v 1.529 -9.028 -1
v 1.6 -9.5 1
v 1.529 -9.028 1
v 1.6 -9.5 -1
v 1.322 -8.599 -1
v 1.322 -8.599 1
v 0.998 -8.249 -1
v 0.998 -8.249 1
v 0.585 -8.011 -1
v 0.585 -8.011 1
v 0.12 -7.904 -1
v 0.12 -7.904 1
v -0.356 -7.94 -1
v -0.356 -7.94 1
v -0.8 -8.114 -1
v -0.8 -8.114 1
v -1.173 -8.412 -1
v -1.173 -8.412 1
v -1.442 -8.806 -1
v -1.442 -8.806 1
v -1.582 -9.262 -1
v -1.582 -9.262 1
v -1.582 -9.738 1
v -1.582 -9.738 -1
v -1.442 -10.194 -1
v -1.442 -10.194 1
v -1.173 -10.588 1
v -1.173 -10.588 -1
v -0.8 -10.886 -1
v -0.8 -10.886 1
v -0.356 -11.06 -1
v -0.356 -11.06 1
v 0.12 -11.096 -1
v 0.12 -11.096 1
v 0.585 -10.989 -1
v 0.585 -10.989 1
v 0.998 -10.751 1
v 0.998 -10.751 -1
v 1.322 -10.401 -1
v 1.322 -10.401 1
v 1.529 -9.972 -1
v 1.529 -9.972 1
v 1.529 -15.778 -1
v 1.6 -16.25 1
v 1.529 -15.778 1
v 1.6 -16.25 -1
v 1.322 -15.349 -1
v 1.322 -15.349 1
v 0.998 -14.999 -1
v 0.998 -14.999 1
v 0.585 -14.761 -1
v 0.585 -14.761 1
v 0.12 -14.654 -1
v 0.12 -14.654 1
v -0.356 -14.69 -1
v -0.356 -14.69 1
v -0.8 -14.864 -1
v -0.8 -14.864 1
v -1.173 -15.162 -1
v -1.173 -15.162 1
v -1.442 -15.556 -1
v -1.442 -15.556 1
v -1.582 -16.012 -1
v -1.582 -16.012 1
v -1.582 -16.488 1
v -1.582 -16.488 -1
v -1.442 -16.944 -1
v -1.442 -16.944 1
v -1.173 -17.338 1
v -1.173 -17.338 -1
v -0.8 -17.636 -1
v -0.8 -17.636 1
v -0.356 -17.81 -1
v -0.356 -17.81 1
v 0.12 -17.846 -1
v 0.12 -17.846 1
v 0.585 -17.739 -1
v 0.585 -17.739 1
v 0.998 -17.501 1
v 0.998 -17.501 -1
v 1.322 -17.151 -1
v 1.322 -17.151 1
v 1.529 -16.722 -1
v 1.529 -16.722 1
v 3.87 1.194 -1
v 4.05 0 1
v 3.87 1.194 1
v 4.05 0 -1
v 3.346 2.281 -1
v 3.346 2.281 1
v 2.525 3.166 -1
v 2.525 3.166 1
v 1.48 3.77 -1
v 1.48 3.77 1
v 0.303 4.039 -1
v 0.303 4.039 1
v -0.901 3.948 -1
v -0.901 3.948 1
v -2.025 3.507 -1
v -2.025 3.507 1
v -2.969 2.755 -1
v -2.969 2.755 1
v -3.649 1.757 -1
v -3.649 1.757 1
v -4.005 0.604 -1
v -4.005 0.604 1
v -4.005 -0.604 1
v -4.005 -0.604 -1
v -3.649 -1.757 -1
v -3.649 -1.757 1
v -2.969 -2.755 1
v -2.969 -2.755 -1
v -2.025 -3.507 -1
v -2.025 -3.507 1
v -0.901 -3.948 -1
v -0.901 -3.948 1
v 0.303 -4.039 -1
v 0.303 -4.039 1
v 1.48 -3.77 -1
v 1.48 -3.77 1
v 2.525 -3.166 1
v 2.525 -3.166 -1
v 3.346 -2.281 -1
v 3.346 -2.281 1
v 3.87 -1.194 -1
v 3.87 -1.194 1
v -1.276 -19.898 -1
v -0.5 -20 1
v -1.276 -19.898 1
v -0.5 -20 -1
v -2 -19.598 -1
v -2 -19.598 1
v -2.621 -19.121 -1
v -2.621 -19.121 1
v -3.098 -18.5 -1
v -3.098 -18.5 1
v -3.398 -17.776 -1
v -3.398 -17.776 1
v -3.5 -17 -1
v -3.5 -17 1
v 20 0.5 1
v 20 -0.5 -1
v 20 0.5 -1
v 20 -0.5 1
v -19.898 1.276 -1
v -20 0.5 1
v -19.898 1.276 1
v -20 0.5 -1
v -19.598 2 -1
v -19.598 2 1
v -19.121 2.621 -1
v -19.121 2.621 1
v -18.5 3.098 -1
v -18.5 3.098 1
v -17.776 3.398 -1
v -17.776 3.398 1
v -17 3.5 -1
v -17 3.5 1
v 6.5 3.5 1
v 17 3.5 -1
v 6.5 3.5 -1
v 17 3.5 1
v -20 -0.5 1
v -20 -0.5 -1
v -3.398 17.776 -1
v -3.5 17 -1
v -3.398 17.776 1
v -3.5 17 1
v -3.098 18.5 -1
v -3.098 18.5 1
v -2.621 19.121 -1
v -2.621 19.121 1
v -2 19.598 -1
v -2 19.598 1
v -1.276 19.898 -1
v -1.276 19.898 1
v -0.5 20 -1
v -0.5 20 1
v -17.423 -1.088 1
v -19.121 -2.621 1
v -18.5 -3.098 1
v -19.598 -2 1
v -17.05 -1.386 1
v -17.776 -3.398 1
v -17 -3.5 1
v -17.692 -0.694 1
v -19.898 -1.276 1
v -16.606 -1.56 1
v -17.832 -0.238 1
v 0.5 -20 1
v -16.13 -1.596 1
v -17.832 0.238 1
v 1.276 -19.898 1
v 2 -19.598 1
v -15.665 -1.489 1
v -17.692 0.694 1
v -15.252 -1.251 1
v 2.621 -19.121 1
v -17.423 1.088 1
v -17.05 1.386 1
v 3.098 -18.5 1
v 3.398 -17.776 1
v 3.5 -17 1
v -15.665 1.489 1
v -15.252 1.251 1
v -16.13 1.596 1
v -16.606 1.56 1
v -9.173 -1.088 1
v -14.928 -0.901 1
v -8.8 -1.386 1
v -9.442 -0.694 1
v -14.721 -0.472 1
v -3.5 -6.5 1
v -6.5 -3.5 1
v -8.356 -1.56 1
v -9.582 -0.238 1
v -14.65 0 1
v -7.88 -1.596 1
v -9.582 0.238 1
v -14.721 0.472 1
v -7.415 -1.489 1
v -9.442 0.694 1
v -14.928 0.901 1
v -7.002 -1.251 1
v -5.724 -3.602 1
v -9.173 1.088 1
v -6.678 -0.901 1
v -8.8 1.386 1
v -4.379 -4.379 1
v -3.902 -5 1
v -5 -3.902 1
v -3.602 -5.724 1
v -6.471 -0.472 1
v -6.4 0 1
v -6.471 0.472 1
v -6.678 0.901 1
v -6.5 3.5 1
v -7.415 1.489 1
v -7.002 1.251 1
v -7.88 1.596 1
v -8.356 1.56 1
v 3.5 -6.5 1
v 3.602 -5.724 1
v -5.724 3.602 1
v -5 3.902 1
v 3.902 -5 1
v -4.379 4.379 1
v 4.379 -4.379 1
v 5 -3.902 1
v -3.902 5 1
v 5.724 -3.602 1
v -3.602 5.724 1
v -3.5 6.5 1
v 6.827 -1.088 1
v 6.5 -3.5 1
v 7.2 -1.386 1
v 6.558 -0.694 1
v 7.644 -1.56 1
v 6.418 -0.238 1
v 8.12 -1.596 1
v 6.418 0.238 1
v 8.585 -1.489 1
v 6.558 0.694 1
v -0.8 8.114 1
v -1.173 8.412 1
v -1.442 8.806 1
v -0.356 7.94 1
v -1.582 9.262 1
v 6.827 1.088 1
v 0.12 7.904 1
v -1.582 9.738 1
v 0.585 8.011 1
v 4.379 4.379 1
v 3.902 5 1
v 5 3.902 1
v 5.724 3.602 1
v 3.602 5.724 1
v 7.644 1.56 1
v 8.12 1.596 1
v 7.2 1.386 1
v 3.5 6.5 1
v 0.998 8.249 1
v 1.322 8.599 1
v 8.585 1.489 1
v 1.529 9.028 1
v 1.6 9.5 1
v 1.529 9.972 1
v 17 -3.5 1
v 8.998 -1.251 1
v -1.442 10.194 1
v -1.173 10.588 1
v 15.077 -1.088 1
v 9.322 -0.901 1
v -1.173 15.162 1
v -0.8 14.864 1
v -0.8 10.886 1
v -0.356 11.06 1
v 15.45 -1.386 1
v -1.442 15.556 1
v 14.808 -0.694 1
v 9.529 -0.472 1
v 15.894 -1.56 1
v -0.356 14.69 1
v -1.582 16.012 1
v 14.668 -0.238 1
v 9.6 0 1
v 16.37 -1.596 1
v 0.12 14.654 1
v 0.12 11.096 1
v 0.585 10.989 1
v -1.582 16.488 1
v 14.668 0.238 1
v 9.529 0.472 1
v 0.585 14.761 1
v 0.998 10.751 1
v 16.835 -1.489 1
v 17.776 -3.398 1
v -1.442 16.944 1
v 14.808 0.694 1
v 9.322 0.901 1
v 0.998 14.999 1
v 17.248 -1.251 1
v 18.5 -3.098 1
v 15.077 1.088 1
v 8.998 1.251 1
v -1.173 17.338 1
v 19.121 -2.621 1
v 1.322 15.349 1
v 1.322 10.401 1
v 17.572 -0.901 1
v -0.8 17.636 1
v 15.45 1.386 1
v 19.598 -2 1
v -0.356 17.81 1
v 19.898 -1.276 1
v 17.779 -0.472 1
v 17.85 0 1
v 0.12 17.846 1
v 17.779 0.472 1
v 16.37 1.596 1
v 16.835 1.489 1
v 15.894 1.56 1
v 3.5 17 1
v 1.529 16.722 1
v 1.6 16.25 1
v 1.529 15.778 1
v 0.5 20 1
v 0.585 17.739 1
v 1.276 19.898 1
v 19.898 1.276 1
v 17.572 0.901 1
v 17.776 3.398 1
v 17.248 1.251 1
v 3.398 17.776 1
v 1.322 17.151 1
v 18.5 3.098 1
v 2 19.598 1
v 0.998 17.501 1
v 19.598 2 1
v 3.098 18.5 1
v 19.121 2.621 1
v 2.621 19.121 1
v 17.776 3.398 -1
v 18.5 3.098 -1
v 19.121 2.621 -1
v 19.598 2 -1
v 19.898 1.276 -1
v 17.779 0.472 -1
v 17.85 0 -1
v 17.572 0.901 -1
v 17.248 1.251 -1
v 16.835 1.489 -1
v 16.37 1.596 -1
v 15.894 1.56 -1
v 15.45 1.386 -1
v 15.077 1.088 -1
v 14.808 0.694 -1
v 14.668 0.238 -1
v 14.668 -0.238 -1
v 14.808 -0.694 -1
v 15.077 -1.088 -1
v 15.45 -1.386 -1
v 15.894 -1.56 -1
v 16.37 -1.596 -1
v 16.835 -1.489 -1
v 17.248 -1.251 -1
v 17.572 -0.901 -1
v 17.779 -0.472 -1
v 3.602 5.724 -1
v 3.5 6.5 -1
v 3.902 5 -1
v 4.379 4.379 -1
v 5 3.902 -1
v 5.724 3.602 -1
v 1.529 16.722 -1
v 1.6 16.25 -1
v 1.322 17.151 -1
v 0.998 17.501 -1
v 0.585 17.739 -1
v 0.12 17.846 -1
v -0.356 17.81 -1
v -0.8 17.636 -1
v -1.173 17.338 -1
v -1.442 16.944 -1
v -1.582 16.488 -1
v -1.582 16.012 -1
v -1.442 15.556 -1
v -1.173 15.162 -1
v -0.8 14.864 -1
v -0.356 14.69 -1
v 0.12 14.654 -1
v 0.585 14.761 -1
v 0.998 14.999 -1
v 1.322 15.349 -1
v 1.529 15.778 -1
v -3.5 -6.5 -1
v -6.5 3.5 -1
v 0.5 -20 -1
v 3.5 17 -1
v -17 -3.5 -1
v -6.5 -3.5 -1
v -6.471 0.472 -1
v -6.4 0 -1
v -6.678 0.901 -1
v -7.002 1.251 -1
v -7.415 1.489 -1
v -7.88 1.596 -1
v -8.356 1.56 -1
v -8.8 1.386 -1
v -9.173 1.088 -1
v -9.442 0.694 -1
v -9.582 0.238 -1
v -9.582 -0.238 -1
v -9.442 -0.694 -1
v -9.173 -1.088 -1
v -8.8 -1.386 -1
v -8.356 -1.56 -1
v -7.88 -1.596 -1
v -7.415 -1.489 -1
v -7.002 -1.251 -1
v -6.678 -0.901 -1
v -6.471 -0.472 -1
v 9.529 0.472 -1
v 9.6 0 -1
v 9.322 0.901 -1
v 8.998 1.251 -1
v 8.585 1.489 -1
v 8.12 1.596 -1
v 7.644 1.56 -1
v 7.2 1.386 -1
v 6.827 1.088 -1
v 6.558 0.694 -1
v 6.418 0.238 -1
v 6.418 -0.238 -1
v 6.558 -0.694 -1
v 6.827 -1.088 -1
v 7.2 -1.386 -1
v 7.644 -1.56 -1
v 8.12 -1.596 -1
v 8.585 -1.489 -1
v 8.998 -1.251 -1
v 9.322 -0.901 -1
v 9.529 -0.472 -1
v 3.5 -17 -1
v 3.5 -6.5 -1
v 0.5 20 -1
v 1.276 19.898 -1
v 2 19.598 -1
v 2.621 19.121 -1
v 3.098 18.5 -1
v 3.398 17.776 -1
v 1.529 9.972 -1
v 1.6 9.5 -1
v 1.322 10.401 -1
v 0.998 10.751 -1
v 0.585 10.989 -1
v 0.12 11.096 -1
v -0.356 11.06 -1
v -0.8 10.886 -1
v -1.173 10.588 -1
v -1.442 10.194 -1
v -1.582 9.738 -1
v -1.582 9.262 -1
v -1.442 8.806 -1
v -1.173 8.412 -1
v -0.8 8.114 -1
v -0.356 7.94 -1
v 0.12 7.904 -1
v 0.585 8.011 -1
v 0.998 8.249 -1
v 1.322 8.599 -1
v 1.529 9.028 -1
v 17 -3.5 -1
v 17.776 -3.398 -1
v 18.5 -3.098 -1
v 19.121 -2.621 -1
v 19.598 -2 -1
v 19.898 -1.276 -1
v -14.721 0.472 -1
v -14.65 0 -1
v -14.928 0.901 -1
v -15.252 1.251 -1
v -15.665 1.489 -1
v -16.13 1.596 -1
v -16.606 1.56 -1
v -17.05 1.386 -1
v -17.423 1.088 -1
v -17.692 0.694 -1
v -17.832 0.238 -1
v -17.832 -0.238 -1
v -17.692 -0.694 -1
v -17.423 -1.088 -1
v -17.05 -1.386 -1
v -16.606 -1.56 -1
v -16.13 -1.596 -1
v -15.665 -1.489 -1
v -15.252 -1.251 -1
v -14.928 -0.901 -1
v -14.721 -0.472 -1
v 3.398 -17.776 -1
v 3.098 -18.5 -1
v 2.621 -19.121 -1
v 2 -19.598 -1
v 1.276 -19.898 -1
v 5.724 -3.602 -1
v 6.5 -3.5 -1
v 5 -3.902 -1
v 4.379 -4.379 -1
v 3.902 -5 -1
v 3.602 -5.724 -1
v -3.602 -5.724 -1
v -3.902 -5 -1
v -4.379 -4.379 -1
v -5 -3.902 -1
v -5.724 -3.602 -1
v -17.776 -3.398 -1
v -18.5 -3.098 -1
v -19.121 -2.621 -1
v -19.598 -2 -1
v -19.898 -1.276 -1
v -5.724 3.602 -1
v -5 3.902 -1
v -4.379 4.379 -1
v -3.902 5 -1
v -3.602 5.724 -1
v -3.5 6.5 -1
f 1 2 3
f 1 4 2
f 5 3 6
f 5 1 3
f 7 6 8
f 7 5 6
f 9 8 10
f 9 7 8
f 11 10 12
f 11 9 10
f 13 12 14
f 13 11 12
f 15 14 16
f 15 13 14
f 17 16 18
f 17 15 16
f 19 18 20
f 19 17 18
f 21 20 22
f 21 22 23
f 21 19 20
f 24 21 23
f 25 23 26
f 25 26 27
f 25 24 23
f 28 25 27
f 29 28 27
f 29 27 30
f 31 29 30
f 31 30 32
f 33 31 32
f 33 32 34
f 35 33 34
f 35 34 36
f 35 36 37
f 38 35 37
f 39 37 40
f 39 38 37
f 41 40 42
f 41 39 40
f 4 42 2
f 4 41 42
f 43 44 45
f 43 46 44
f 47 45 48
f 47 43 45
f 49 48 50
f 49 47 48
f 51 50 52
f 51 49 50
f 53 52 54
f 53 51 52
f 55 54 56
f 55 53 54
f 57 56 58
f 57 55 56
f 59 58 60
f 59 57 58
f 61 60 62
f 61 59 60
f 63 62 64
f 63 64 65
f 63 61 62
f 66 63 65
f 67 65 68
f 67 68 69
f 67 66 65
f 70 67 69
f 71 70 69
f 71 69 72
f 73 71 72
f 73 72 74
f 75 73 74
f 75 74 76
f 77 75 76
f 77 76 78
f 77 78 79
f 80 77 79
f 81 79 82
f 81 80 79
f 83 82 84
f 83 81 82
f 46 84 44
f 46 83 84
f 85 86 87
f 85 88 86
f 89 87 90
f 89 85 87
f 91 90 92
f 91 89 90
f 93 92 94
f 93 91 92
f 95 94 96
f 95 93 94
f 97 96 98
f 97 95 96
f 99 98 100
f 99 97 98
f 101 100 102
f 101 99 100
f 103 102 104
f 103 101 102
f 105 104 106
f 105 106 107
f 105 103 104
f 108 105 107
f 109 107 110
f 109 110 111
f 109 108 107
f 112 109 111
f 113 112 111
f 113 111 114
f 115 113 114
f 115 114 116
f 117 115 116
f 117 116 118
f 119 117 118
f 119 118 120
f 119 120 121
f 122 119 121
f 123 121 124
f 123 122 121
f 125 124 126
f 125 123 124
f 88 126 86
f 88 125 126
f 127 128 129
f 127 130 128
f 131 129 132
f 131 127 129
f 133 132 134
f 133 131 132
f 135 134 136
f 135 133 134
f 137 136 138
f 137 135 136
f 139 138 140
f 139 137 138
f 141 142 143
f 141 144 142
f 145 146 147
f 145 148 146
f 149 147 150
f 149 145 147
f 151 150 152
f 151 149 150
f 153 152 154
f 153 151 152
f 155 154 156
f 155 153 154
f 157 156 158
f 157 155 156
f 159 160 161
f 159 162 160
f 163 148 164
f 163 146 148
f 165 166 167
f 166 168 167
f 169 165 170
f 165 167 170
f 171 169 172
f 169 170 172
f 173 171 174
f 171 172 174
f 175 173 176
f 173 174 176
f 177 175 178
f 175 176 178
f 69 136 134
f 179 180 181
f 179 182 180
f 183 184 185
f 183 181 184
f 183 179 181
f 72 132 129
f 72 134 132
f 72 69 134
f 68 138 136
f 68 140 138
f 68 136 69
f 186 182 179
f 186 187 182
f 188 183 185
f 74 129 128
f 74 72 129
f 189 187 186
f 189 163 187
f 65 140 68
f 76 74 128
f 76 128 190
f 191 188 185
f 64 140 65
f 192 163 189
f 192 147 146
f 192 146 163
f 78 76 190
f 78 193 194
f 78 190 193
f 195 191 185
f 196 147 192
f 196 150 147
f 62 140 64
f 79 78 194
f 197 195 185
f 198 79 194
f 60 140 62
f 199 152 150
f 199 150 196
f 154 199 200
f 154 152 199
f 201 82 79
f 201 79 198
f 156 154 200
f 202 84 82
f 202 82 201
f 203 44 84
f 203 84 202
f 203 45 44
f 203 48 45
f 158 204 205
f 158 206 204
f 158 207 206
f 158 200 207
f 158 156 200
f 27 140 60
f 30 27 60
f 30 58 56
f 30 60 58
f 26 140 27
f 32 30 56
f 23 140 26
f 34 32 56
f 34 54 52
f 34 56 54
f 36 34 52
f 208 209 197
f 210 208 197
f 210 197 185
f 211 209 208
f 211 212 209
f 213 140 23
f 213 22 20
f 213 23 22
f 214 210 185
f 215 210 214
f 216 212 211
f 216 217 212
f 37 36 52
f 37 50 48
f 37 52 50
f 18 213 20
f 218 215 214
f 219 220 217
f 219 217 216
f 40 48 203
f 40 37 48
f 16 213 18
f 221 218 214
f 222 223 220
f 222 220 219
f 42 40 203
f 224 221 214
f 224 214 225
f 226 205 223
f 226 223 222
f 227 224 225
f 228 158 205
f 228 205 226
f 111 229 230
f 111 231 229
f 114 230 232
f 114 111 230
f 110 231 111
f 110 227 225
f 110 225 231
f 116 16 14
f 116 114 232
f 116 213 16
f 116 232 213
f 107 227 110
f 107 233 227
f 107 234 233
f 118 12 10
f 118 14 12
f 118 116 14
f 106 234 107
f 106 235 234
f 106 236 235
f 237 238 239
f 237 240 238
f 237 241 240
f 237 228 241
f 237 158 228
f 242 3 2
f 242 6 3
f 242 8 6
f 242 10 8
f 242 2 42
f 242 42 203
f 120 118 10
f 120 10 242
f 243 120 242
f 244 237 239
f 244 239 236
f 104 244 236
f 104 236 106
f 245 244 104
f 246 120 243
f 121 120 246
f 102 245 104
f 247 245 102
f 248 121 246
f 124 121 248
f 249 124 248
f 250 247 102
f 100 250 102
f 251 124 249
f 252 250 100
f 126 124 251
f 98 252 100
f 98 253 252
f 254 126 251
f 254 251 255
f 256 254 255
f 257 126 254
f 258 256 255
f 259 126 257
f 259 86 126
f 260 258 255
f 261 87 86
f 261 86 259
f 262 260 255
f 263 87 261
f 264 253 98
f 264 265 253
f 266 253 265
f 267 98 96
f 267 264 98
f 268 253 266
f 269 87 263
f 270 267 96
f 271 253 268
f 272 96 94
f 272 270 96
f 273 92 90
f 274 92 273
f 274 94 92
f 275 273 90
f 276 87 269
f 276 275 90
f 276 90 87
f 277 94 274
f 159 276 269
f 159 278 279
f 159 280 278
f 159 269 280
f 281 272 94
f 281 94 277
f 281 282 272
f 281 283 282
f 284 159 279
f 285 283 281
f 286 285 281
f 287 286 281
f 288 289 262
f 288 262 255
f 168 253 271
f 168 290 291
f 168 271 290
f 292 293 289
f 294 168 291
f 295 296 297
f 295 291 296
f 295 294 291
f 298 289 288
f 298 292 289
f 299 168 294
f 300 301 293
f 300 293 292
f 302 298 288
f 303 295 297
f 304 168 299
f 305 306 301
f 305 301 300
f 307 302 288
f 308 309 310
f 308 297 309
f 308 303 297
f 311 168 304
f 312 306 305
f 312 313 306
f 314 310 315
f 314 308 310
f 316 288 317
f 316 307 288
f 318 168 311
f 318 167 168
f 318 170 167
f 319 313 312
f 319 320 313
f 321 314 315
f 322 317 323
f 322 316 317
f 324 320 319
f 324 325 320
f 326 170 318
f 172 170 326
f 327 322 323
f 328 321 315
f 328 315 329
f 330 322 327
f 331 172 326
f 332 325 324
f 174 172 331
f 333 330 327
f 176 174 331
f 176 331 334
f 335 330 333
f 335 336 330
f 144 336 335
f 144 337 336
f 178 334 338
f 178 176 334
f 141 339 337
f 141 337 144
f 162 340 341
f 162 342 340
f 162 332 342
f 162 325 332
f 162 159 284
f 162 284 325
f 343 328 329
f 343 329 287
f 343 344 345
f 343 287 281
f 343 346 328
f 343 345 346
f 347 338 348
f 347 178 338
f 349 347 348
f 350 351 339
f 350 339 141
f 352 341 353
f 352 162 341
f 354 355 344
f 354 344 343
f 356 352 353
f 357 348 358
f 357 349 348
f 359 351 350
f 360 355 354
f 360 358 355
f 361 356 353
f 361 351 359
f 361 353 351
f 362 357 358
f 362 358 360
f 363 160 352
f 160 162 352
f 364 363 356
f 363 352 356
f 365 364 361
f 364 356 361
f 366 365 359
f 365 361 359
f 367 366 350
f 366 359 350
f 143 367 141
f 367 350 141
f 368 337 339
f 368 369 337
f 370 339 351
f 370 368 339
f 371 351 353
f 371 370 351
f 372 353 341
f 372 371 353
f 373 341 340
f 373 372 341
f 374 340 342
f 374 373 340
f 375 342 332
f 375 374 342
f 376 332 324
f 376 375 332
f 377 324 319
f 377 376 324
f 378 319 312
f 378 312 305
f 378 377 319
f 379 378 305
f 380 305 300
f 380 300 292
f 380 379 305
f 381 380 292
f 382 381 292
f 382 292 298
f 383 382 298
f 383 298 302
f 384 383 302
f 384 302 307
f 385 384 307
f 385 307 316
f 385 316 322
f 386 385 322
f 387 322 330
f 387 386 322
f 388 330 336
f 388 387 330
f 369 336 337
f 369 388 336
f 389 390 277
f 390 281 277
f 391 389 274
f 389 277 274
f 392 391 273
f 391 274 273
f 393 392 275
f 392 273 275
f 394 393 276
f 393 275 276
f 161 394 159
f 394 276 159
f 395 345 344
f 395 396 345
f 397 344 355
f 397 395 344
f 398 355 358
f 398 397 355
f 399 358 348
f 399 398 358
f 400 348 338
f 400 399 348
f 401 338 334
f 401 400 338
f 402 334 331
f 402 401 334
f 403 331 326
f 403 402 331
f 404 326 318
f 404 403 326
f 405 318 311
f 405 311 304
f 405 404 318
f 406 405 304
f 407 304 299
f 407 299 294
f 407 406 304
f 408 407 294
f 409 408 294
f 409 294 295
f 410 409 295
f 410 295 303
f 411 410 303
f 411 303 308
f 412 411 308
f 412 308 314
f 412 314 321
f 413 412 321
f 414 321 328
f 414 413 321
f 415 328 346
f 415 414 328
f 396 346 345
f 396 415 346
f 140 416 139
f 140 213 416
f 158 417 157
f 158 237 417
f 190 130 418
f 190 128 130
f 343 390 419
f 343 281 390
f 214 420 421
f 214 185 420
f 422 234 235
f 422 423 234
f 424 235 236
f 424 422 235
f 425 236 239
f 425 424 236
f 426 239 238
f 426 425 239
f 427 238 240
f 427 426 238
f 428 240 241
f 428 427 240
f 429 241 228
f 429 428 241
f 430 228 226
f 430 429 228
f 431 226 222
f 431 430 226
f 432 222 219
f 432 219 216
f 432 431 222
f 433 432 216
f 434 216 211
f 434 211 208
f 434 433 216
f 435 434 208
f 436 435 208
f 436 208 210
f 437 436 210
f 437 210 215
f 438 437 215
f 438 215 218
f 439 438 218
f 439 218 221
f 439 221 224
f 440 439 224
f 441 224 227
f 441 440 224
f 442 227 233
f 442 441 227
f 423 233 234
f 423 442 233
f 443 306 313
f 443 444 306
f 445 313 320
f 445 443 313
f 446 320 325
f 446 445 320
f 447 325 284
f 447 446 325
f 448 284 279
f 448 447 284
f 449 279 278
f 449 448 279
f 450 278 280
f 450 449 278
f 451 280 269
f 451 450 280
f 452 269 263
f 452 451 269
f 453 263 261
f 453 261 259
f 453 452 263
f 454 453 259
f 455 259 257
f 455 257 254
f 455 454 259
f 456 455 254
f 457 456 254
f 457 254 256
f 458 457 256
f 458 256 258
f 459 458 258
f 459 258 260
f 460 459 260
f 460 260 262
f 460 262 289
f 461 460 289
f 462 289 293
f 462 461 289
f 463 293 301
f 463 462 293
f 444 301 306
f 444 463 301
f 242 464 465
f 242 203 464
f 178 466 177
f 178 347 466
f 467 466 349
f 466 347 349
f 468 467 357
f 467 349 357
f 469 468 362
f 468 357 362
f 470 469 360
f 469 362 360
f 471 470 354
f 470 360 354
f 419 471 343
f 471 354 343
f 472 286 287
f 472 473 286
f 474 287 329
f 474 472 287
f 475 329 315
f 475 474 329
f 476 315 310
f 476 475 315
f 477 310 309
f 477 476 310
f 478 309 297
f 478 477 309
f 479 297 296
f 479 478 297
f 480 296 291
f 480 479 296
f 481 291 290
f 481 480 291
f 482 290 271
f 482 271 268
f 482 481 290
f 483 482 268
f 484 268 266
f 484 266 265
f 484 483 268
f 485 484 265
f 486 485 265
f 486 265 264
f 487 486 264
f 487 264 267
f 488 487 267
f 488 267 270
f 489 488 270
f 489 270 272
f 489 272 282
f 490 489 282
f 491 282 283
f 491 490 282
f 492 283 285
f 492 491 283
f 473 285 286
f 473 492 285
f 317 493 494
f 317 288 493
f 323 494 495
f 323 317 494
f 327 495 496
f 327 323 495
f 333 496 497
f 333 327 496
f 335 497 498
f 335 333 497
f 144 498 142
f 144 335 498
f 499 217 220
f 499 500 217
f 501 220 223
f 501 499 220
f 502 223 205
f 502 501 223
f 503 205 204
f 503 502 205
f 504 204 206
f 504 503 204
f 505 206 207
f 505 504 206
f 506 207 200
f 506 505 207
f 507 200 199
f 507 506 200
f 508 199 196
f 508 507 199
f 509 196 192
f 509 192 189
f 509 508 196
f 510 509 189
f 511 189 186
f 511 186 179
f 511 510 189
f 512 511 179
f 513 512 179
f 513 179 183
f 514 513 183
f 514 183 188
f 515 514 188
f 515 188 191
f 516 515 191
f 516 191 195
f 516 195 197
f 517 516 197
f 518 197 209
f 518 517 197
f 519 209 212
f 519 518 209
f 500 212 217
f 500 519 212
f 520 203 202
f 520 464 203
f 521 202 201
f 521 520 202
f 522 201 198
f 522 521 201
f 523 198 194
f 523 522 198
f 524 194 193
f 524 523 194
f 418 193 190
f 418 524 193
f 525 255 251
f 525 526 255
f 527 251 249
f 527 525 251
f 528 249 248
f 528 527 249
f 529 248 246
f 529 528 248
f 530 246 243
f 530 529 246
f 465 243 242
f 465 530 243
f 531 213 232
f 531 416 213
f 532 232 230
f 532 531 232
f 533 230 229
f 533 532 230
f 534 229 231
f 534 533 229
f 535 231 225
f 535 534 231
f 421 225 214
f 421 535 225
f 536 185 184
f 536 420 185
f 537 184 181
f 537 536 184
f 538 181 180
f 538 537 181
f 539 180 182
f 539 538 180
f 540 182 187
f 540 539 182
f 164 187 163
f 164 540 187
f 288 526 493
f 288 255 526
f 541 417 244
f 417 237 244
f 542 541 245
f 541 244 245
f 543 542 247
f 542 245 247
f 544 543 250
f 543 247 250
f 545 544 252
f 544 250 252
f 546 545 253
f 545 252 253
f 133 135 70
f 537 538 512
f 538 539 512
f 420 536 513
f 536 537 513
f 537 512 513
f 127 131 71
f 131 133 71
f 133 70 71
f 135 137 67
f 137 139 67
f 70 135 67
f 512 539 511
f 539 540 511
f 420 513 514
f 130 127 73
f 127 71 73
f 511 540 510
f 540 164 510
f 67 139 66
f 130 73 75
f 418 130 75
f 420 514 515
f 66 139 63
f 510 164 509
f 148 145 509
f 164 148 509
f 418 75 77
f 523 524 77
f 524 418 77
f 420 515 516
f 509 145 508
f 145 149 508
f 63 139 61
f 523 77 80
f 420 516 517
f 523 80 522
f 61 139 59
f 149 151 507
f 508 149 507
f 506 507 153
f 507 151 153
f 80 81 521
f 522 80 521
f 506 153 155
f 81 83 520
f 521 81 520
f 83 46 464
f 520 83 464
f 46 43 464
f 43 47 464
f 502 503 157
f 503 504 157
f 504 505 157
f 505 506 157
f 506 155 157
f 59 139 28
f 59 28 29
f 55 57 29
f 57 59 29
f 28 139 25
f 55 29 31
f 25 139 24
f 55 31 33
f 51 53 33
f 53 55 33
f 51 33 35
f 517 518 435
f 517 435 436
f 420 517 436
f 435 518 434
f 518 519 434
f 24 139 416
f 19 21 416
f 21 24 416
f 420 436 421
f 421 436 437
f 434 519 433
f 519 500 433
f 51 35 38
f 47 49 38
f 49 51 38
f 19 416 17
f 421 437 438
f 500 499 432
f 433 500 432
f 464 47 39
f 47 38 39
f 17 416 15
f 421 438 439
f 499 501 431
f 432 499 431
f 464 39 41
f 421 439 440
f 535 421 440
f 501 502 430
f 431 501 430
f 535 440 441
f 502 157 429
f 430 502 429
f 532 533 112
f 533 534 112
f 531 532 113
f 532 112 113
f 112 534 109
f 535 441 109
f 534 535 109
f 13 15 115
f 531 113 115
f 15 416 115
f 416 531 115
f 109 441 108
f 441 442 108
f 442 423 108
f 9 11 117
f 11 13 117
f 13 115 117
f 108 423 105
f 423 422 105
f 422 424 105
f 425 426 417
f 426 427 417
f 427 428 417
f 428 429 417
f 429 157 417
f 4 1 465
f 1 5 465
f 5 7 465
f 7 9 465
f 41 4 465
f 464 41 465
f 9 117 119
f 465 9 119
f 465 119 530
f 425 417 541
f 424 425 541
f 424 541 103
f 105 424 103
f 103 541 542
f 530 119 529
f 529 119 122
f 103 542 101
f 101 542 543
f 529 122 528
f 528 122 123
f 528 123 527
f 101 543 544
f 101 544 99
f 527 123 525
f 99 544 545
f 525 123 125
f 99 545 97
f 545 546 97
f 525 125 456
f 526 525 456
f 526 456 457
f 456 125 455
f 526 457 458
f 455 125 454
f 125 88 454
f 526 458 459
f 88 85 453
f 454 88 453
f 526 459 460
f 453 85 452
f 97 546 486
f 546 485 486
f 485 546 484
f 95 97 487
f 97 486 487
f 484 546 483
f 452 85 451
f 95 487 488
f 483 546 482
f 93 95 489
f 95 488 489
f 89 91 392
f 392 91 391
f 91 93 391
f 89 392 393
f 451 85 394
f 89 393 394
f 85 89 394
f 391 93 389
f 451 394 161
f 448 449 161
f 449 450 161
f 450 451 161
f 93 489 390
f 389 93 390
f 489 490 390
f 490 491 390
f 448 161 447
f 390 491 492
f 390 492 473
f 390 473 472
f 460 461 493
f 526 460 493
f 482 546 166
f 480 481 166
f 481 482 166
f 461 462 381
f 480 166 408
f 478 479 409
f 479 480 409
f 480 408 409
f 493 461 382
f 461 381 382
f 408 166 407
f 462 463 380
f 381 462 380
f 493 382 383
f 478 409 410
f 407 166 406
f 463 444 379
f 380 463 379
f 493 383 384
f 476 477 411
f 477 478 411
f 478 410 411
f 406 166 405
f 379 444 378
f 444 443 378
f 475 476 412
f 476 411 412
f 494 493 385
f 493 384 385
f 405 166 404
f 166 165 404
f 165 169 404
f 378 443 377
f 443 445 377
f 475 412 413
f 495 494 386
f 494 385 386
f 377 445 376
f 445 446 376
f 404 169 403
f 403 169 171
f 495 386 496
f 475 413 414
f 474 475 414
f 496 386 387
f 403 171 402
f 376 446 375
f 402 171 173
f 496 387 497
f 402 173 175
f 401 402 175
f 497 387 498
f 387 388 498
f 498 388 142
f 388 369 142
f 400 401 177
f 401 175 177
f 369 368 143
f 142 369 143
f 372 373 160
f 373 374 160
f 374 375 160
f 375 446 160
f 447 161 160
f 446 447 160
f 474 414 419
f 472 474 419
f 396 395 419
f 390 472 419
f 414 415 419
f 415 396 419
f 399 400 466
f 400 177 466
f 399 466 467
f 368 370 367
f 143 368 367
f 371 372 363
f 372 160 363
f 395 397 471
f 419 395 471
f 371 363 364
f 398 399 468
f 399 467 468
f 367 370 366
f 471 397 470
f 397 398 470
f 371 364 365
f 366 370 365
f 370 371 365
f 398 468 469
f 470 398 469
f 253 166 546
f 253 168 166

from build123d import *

# Parameters (mm, degrees)
CROQUIS1_R              = 1.6
CROQUIS1_R_2            = 4.05
SALIENTE_EXTRUIR1_DEPTH = 1
REDONDEO1_R             = 3


with BuildPart() as part:
    # Croquis1 → Saliente-Extruir1 (new body, symmetric)
    with BuildSketch(Plane.XY):
        Polygon((3.5, -3.5), (20, -3.5), (20, 3.5), (3.5, 3.5), (3.5, 20), (-3.5, 20), (-3.5, 3.5), (-20, 3.5), (-20, -3.5), (-3.5, -3.5), (-3.5, -20), (3.5, -20), align=None)
        with Locations((-8, 0)):
            Circle(CROQUIS1_R, mode=Mode.SUBTRACT)
        with Locations((8, 0)):
            Circle(CROQUIS1_R, mode=Mode.SUBTRACT)
        with Locations((0, 16.25)):
            Circle(CROQUIS1_R, mode=Mode.SUBTRACT)
        with Locations((0, -16.25)):
            Circle(CROQUIS1_R, mode=Mode.SUBTRACT)
        Circle(CROQUIS1_R_2, mode=Mode.SUBTRACT)
        with Locations((0, 9.5)):
            Circle(CROQUIS1_R, mode=Mode.SUBTRACT)
        with Locations((0, -9.5)):
            Circle(CROQUIS1_R, mode=Mode.SUBTRACT)
        with Locations((-16.25, 0)):
            Circle(CROQUIS1_R, mode=Mode.SUBTRACT)
        with Locations((16.25, 0)):
            Circle(CROQUIS1_R, mode=Mode.SUBTRACT)
    extrude(amount=SALIENTE_EXTRUIR1_DEPTH, both=True)

    # Redondeo1
    redondeo1_edges = [part.edges().sort_by_distance(p)[0] for p in [
        (3.5, -20, 0),
        (-3.5, -20, 0),
        (-3.5, -3.5, 0),
        (-20, -3.5, 0),
        (-20, 3.5, 0),
        (-3.5, 3.5, 0),
        (-3.5, 20, 0),
        (3.5, 20, 0),
        (3.5, 3.5, 0),
        (20, 3.5, 0),
        (20, -3.5, 0),
        (3.5, -3.5, 0),
    ]]
    fillet(redondeo1_edges, radius=REDONDEO1_R)


solid = part.part
